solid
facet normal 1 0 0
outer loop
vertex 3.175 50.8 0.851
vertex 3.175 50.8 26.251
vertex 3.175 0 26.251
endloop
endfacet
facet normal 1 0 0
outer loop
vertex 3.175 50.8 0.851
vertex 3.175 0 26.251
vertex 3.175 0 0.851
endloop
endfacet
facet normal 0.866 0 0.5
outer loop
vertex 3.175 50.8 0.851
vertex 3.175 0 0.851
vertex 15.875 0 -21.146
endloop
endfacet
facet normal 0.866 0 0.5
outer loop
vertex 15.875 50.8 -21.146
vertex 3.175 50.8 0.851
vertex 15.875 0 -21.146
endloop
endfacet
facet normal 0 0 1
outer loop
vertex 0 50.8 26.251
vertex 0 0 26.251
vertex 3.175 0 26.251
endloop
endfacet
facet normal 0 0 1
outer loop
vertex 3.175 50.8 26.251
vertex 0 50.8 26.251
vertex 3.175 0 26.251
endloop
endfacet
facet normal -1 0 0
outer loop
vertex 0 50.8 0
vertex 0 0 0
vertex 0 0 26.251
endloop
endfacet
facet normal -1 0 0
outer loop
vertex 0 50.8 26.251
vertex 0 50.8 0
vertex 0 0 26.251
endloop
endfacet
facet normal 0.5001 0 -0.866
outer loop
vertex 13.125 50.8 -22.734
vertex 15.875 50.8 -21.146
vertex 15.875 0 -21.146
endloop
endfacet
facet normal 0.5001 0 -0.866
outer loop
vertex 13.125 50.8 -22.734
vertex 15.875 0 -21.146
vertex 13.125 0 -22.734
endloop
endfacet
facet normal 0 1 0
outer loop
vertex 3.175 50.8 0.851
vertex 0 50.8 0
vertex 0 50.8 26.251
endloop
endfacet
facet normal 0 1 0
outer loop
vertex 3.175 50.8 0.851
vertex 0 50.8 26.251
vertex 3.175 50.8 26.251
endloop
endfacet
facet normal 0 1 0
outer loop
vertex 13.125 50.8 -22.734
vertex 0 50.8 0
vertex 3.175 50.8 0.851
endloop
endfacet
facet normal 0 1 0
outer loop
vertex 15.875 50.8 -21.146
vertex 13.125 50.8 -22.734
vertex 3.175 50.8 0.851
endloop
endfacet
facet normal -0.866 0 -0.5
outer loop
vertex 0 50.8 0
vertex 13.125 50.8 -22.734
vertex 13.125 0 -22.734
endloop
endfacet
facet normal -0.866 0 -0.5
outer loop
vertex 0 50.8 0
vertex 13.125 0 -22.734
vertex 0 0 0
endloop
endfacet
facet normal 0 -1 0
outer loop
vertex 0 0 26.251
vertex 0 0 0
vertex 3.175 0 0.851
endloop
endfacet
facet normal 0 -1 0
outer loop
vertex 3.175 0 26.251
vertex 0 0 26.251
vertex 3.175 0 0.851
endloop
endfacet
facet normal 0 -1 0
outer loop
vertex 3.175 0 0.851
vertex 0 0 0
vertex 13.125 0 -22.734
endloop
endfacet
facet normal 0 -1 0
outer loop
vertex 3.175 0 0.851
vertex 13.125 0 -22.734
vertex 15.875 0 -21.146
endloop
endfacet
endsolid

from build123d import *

# Parameters (mm, degrees)
BOSS_EXTRUDE1_DEPTH = 50.8


with BuildPart() as part:
    # Sketch1 → Boss-Extrude1 (new body)
    with BuildSketch(Plane(origin=(0, 0, 0), x_dir=(1, 0, 0), z_dir=(0, 1, 0))):
        Polygon((2.749630657, -1.5875), (0, 0), (0, -26.250738686), (3.175, -26.250738686), (3.175, -0.850738686), align=None)
        Polygon((15.875, 21.14630657), (13.125369343, 22.73380657), (0, 0), (3.175, 0), (3.175, -0.850738686), align=None)
        Polygon((3.175, 0), (0, 0), (2.749630657, -1.5875), (3.175, -0.850738686), align=None)
    extrude(amount=BOSS_EXTRUDE1_DEPTH)


solid = part.part
